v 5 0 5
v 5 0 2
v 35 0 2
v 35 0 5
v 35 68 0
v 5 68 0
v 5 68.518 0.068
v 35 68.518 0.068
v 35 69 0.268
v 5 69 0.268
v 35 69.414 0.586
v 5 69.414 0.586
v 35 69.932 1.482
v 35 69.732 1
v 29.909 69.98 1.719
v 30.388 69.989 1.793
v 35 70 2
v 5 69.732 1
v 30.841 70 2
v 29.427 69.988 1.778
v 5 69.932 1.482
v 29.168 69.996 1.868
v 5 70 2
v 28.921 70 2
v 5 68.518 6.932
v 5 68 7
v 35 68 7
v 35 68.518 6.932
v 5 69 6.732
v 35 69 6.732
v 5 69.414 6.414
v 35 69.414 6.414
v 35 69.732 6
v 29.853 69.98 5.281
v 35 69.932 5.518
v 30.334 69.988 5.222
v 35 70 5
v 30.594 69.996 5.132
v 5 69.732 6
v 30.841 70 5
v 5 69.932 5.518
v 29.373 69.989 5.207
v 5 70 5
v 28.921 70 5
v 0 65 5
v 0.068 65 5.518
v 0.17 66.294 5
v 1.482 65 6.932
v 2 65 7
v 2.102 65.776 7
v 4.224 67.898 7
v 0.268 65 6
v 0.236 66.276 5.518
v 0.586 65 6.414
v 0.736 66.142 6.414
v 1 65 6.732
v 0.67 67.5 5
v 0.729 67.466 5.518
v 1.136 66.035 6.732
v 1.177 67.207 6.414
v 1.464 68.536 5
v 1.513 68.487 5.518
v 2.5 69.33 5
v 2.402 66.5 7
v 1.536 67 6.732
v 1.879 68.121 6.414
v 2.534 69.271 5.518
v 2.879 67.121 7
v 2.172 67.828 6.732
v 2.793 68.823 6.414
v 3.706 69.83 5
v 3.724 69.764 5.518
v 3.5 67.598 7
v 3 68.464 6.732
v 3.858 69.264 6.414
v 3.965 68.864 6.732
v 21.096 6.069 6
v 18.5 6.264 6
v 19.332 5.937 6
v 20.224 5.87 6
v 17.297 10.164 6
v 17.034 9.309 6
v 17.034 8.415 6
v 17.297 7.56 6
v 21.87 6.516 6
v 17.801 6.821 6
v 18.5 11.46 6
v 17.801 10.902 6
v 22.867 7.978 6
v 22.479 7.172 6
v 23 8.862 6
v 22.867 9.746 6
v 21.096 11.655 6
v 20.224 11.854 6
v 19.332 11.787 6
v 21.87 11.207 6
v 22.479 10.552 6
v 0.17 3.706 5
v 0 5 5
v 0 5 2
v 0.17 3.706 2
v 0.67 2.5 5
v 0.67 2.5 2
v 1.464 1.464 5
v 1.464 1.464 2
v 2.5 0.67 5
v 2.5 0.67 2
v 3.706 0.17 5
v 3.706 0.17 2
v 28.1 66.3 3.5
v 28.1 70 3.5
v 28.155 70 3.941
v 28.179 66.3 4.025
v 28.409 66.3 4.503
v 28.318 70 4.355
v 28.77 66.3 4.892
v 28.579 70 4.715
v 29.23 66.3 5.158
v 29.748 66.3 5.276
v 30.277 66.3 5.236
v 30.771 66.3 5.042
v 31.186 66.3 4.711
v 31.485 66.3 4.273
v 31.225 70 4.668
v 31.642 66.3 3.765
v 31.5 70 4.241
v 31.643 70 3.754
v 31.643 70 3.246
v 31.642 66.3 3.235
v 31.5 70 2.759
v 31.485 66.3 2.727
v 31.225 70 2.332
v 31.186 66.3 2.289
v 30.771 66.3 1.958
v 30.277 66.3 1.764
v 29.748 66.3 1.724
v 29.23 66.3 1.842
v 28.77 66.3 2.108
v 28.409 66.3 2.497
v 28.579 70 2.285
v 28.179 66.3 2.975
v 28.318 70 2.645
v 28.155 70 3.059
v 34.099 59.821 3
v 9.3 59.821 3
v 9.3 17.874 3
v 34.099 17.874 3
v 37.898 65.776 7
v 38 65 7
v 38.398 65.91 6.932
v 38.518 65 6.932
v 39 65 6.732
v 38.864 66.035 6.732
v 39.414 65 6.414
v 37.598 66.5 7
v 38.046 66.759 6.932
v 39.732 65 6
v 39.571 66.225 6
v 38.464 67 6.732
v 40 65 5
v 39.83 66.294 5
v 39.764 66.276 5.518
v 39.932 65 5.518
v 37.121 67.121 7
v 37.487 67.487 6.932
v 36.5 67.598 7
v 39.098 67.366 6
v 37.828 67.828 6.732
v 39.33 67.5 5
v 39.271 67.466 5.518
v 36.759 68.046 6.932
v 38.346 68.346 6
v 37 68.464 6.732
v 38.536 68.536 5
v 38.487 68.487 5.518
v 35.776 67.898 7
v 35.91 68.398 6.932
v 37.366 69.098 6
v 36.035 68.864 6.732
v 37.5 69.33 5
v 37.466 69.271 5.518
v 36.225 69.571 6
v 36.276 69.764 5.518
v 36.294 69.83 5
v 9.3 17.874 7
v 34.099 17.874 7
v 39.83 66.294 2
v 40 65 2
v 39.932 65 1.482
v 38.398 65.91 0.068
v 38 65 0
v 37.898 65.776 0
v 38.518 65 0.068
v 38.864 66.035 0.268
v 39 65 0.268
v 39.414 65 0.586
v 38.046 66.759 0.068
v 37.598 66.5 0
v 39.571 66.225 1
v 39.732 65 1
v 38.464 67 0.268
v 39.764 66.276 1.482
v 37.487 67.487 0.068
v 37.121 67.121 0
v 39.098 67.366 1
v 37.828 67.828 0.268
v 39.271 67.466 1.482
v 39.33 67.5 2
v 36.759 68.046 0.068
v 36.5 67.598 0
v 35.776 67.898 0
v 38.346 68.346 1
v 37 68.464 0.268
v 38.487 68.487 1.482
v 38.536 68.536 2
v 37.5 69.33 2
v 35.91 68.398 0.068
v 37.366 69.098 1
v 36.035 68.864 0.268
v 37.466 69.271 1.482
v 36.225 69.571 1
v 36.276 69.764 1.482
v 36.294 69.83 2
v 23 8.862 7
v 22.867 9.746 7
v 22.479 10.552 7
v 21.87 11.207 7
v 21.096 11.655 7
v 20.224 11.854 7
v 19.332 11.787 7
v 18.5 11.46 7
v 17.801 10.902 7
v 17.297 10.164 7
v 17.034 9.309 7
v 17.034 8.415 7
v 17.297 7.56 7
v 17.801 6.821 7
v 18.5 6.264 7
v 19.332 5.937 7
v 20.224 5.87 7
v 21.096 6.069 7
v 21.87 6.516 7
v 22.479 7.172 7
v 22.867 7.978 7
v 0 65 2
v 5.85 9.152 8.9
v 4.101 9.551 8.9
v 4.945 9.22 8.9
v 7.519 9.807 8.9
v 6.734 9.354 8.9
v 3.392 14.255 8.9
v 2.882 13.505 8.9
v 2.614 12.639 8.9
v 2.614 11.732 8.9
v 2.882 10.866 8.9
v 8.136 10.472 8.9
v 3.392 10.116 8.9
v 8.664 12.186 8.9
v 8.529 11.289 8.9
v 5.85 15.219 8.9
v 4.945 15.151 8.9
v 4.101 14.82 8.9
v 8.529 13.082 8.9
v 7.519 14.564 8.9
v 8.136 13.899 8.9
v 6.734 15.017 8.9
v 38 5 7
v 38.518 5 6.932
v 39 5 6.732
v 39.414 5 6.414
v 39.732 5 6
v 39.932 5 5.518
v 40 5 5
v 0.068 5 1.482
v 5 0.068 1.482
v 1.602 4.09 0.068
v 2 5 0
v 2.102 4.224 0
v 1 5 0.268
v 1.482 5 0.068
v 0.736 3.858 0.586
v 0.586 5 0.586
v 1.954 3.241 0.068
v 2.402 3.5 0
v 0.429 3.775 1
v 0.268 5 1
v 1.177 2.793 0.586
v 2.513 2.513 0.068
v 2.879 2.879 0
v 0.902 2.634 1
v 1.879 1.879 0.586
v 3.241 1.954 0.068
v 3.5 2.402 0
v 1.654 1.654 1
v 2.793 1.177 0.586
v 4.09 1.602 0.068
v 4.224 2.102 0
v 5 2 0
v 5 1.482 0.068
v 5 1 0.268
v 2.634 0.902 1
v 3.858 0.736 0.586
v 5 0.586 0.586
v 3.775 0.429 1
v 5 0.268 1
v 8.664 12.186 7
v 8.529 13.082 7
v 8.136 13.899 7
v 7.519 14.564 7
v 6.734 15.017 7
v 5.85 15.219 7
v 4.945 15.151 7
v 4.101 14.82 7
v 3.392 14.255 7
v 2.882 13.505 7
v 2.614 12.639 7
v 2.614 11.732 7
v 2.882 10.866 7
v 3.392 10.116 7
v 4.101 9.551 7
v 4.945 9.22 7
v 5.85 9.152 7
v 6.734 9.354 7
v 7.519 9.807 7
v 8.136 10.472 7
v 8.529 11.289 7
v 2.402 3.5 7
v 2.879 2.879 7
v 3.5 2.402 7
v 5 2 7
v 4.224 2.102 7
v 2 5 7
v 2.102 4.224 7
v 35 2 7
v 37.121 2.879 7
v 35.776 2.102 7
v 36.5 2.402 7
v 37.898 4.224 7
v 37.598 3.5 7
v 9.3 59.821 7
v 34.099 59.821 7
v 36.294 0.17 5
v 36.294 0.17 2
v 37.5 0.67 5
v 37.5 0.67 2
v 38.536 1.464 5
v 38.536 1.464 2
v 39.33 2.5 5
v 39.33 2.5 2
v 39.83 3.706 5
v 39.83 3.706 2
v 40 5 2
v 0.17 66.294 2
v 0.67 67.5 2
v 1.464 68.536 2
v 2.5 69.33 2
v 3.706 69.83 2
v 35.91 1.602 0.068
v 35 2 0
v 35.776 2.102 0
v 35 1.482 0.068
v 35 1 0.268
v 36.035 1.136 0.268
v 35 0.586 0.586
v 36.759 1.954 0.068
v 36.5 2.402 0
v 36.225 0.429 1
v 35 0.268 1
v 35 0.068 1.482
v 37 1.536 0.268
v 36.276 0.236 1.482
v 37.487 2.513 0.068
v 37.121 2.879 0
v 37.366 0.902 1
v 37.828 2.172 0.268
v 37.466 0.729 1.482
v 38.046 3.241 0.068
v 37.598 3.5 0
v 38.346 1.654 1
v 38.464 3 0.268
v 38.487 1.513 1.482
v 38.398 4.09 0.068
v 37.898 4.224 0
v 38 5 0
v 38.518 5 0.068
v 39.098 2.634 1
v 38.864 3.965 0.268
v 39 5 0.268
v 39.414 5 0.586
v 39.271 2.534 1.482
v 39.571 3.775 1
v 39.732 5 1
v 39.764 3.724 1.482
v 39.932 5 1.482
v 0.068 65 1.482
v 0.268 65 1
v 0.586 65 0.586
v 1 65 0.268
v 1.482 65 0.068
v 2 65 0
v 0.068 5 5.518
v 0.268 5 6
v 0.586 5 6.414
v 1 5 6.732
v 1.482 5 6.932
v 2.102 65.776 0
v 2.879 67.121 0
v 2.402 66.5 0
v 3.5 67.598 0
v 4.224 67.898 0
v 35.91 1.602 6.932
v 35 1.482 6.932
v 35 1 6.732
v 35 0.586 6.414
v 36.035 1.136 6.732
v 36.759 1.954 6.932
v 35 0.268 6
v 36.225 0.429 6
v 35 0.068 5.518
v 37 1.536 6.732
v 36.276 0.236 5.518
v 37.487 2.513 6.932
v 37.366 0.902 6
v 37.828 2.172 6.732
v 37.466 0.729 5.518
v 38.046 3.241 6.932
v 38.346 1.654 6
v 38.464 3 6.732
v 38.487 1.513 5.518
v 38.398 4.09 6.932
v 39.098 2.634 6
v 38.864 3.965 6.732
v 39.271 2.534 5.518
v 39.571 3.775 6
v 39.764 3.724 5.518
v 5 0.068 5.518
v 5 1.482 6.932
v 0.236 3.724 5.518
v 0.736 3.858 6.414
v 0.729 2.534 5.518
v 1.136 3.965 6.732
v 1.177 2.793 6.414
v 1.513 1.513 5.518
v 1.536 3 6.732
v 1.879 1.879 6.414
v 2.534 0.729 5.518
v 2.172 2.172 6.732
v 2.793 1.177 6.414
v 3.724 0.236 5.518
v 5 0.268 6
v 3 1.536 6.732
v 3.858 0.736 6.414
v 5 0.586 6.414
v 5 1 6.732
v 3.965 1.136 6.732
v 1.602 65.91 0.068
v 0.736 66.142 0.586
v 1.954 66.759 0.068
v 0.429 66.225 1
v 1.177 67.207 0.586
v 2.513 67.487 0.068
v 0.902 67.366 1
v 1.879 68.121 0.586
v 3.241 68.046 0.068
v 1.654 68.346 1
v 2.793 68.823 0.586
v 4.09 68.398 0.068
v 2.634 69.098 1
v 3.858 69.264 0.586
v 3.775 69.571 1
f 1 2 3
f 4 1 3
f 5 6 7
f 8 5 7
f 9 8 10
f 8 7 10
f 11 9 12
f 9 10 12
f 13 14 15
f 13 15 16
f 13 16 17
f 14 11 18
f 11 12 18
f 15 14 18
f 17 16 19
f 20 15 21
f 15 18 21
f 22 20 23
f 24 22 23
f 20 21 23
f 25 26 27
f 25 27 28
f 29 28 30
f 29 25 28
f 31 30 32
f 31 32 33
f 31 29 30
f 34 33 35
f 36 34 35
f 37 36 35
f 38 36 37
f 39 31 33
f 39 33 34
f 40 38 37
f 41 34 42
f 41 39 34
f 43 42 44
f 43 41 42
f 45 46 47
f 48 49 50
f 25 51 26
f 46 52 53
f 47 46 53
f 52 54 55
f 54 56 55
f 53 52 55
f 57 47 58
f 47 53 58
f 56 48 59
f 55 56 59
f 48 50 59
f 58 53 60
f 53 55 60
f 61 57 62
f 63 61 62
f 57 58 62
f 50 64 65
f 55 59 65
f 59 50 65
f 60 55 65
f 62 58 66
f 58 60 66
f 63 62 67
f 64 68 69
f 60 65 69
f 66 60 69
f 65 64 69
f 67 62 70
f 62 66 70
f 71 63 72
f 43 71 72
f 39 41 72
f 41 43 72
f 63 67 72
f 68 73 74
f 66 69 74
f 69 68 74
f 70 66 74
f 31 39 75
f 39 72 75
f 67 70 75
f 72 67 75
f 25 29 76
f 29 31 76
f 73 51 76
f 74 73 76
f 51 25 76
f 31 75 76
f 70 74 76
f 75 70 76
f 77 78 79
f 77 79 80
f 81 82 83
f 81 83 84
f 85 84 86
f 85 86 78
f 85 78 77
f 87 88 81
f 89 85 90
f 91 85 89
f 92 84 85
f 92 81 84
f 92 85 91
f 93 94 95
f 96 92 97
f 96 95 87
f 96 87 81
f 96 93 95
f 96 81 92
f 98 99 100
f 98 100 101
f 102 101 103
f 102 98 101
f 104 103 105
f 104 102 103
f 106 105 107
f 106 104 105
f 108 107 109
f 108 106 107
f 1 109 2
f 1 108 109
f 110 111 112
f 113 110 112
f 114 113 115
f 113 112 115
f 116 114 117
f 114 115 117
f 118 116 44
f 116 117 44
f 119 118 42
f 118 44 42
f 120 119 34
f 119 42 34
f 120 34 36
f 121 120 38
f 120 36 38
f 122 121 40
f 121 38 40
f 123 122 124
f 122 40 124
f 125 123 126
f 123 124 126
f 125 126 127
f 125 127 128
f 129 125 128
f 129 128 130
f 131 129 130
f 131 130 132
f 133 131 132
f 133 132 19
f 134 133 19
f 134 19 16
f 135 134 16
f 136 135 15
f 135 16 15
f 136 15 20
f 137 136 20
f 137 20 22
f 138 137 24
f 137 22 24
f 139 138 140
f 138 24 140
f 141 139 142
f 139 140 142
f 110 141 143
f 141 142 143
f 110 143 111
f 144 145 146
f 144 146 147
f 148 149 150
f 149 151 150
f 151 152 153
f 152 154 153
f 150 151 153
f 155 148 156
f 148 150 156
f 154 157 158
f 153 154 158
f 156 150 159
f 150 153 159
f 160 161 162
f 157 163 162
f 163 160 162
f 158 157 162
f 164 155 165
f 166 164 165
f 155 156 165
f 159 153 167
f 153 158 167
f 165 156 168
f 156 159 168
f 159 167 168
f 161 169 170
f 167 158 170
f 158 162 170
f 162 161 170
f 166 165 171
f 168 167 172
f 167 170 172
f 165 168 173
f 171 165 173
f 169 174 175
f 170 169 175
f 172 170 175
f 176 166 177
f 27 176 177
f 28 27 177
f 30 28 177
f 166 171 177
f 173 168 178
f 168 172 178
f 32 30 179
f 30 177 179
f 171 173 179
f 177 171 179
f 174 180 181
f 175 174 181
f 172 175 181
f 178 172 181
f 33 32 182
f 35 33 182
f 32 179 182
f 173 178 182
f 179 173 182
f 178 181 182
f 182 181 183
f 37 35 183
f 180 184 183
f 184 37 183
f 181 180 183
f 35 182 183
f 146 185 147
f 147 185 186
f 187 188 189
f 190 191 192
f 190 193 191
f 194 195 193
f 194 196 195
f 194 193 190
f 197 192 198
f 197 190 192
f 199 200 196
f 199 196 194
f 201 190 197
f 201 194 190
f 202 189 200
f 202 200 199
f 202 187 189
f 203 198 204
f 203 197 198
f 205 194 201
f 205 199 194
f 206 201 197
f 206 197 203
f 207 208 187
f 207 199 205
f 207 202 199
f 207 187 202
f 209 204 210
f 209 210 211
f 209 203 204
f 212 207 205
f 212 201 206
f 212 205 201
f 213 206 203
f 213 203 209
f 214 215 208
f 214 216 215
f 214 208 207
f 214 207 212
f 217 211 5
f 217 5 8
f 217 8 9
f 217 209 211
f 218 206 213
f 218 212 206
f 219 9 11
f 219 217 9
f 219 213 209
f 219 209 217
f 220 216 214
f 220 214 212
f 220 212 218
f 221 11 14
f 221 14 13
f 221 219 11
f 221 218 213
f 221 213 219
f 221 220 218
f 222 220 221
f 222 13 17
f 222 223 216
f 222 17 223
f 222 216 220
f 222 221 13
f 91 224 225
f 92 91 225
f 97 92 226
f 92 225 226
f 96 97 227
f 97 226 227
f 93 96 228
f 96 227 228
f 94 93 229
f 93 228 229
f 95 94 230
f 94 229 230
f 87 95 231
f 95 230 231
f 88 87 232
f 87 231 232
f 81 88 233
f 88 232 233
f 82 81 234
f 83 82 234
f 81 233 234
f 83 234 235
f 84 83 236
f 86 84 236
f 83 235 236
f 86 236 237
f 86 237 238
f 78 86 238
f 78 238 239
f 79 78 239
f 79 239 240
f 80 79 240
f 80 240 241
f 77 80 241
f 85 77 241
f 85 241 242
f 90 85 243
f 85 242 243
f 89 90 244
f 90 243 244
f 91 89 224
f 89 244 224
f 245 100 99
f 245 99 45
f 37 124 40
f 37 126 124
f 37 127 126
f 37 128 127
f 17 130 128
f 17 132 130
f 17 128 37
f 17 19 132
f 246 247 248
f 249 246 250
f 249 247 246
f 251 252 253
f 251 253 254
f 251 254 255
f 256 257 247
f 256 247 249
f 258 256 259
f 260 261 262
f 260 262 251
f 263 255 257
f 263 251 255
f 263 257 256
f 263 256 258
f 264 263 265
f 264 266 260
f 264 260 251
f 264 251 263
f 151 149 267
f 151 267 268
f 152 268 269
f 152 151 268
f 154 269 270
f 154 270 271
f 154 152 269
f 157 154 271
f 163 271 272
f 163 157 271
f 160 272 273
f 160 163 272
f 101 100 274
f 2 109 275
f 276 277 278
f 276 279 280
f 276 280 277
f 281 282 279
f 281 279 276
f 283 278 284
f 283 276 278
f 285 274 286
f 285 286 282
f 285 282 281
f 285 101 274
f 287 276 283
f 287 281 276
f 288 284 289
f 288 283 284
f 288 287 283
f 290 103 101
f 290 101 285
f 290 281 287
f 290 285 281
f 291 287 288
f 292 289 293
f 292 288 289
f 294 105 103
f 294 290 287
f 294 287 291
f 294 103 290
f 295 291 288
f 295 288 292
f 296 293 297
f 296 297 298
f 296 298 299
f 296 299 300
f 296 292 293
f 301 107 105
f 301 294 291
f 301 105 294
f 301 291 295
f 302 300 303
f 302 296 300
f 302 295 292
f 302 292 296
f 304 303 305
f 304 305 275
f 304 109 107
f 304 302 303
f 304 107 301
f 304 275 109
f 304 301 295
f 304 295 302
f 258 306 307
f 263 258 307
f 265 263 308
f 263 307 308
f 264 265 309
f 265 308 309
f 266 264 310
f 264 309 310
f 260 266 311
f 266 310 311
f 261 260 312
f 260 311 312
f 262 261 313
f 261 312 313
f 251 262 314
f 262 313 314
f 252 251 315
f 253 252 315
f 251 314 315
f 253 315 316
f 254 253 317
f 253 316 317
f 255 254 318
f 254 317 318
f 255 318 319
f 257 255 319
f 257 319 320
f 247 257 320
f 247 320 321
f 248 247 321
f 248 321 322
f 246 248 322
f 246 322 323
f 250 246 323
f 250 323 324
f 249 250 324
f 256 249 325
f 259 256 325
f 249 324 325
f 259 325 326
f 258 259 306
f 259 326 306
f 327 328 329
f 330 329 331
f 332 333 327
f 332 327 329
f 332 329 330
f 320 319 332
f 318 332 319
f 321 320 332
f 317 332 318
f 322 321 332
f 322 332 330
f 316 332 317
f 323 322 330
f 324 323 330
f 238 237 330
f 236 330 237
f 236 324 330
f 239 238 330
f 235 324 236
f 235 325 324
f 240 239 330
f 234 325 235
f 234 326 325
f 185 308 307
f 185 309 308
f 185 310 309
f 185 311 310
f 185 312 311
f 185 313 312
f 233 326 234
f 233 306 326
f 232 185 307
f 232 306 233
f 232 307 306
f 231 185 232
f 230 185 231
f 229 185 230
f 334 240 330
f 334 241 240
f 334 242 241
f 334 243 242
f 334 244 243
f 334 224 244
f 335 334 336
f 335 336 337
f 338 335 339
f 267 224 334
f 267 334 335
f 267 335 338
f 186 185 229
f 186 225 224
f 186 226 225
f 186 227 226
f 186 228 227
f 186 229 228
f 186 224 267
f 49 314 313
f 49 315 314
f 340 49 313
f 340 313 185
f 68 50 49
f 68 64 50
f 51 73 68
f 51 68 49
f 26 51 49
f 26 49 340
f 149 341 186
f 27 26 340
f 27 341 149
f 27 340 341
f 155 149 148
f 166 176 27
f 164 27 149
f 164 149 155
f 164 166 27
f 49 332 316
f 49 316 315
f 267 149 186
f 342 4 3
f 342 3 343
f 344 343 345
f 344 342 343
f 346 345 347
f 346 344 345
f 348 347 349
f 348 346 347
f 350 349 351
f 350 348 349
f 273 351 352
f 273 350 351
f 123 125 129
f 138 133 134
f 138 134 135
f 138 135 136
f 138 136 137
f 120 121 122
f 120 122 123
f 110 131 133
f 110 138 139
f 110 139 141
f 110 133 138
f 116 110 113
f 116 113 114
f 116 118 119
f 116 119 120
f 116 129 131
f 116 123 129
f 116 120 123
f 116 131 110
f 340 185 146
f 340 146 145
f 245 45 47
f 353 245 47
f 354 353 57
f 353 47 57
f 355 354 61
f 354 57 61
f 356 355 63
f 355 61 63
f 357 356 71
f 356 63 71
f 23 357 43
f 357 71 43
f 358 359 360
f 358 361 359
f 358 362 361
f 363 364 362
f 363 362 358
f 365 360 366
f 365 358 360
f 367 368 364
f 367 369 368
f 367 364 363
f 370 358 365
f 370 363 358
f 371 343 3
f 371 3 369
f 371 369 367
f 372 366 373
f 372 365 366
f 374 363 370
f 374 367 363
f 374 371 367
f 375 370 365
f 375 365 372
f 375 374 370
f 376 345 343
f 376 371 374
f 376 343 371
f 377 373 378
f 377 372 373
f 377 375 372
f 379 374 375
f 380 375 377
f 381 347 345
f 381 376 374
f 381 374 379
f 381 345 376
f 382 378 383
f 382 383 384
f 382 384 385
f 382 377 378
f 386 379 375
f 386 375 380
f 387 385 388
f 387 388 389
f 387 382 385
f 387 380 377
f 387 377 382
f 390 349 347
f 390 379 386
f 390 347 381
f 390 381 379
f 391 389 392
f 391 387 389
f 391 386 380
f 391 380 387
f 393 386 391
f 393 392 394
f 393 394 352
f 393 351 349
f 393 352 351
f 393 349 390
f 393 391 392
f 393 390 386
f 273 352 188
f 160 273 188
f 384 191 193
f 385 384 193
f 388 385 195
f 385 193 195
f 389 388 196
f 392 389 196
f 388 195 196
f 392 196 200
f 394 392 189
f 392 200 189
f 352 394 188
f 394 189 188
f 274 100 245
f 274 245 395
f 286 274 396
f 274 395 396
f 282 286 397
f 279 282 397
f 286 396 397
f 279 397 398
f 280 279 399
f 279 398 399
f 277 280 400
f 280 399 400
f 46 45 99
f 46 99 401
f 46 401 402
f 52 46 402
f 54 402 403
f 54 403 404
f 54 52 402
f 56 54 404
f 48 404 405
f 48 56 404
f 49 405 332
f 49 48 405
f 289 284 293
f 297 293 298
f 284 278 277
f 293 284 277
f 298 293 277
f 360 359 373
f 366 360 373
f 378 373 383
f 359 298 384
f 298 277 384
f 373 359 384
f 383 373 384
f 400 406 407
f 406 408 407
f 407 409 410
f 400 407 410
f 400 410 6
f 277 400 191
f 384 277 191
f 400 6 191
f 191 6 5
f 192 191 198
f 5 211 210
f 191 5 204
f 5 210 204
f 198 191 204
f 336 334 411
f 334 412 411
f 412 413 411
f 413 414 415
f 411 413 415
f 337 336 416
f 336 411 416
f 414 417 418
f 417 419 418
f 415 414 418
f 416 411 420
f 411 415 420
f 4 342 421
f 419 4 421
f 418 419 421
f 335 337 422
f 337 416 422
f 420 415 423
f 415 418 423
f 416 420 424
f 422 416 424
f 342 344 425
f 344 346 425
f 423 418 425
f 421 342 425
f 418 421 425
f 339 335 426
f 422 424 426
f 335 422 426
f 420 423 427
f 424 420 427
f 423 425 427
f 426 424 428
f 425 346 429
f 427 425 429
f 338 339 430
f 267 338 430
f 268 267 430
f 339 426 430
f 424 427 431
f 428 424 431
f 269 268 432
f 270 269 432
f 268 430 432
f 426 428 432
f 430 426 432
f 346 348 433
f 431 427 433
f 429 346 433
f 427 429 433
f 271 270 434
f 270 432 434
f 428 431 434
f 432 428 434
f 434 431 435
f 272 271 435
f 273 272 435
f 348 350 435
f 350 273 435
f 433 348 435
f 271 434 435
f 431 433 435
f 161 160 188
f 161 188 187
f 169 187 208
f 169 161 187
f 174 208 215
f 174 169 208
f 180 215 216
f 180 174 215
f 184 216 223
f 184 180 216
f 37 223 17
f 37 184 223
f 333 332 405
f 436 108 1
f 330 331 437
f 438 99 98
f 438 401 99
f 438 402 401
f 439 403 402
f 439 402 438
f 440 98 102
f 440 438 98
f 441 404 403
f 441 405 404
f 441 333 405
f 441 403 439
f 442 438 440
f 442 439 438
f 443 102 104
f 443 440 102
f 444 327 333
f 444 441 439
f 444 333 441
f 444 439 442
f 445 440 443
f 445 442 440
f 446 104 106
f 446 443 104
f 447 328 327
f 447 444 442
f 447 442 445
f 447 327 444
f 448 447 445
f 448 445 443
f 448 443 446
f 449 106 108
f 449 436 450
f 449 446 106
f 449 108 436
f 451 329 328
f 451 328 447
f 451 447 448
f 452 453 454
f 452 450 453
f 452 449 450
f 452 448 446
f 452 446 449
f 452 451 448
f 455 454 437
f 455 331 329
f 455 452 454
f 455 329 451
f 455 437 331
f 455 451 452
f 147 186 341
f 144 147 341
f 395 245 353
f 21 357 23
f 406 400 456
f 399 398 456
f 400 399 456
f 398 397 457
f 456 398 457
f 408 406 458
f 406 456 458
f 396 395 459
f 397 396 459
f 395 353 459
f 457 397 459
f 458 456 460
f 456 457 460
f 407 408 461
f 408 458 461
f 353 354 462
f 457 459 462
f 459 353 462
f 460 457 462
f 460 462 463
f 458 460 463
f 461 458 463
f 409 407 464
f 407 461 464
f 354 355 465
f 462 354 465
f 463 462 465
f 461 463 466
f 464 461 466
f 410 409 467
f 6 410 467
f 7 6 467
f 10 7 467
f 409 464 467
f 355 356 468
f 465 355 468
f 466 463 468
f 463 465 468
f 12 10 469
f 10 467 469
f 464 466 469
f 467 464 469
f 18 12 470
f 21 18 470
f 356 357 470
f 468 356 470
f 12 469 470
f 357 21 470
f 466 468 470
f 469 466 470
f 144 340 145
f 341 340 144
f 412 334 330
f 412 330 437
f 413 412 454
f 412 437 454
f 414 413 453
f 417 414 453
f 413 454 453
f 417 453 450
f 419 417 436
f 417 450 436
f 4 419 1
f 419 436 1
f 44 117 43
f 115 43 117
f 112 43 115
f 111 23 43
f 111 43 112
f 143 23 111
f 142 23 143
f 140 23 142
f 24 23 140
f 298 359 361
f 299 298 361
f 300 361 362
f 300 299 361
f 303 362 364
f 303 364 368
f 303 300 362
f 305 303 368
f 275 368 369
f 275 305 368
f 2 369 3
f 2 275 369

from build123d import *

# Parameters (mm, degrees)
F0_W         = 40
F0_H         = 70
F1_DEPTH     = 7
F2_R         = 5
F3_R         = 1.780942195
F4_DEPTH     = 3.7
F5_T1_DEPTH  = 60
F5_T3_DEPTH  = 30
F5_T6_ANGLE  = 90
F5_T8_ANGLE  = 90
F5_T10_ANGLE = 90
F5_T12_ANGLE = 90
F5_T14_ANGLE = 90
F5_T16_ANGLE = 90
F5_T18_ANGLE = 90
F5_T20_ANGLE = 90
F6_R         = 3
F7_DEPTH     = 1
F8_W         = 24.7989948839
F8_H         = 41.9472400099
F9_DEPTH     = 4
F10_R        = 3.0419567341
F11_DEPTH    = 1.9


# Not quite as in the source:
# - a fillet or chamfer that OpenCascade refuses, or shapes differently, is made with other operations: its cross-section is extruded or revolved along the edge and cut away or added


with BuildPart() as f1:
    # F0 (on Top) → F1 (new body)
    with BuildSketch(Plane.XY):
        with Locations((20, 35)):
            Rectangle(F0_W, F0_H)
    extrude(amount=F1_DEPTH)

    # F2
    f2_edges = [f1.edges().sort_by_distance(p)[0] for p in [
        (0, 0, 3.5),
        (40, 0, 3.5),
        (40, 70, 3.5),
        (0, 70, 3.5),
    ]]
    fillet(f2_edges, radius=F2_R)

    # F3 (on face) → F4 (cut)
    with BuildSketch(Plane(origin=(0, 70, 0), x_dir=(-1, 0, 0), z_dir=(0, 1, 0))):
        with Locations((-29.880721122, 3.5)):
            Circle(F3_R)
    extrude(amount=-F4_DEPTH, mode=Mode.SUBTRACT)

    # F5: fillet of radius 2 on 16 edges, made by hand

    # F5_s2 → F5_t1 (cut)
    with BuildSketch(Plane.XZ.offset(-65)):
        with BuildLine():
            ThreePointArc((38, 0), (39.4142135624, 0.5857864376), (40, 2))
            Line((40, 2), (40, 0))
            Line((40, 0), (38, 0))
        make_face()
        with BuildLine():
            ThreePointArc((38, 7), (39.4142135624, 6.4142135624), (40, 5))
            Line((40, 5), (40, 7))
            Line((40, 7), (38, 7))
        make_face()
        with BuildLine():
            ThreePointArc((0, 2), (0.5857864376, 0.5857864376), (2, 0))
            Line((2, 0), (0, 0))
            Line((0, 0), (0, 2))
        make_face()
        with BuildLine():
            ThreePointArc((0, 5), (0.5857864376, 6.4142135624), (2, 7))
            Line((2, 7), (0, 7))
            Line((0, 7), (0, 5))
        make_face()
    extrude(amount=F5_T1_DEPTH, mode=Mode.SUBTRACT)

    # F5_s4 → F5_t3 (cut)
    with BuildSketch(Plane.YZ.offset(5)):
        with BuildLine():
            ThreePointArc((68, 0), (69.4142135624, 0.5857864376), (70, 2))
            Line((70, 2), (70, 0))
            Line((70, 0), (68, 0))
        make_face()
        with BuildLine():
            ThreePointArc((2, 0), (0.5857864376, 0.5857864376), (0, 2))
            Line((0, 2), (0, 0))
            Line((0, 0), (2, 0))
        make_face()
        with BuildLine():
            ThreePointArc((68, 7), (69.4142135624, 6.4142135624), (70, 5))
            Line((70, 5), (70, 7))
            Line((70, 7), (68, 7))
        make_face()
        with BuildLine():
            ThreePointArc((2, 7), (0.5857864376, 6.4142135624), (0, 5))
            Line((0, 5), (0, 7))
            Line((0, 7), (2, 7))
        make_face()
    extrude(amount=F5_T3_DEPTH, mode=Mode.SUBTRACT)

    # F5_s5 → F5_t6 (revolve, cut)
    with BuildSketch(Plane.XZ.offset(-65)):
        with BuildLine():
            ThreePointArc((2, 0), (0.5857864376, 0.5857864376), (0, 2))
            Line((0, 2), (0, 0))
            Line((0, 0), (2, 0))
        make_face()
    revolve(axis=Axis((5, 65, 0), (0, 0, -1)), revolution_arc=F5_T6_ANGLE, mode=Mode.SUBTRACT)

    # F5_s7 → F5_t8 (revolve, cut)
    with BuildSketch(Plane.XZ.offset(-5)):
        with BuildLine():
            ThreePointArc((2, 0), (0.5857864376, 0.5857864376), (0, 2))
            Line((0, 2), (0, 0))
            Line((0, 0), (2, 0))
        make_face()
    revolve(axis=Axis((5, 5, 0), (0, 0, 1)), revolution_arc=F5_T8_ANGLE, mode=Mode.SUBTRACT)

    # F5_s9 → F5_t10 (revolve, cut)
    with BuildSketch(Plane.XZ.offset(-65)):
        with BuildLine():
            ThreePointArc((38, 0), (39.4142135624, 0.5857864376), (40, 2))
            Line((40, 2), (40, 0))
            Line((40, 0), (38, 0))
        make_face()
    revolve(axis=Axis((35, 65, 0), (0, 0, 1)), revolution_arc=F5_T10_ANGLE, mode=Mode.SUBTRACT)

    # F5_s11 → F5_t12 (revolve, cut)
    with BuildSketch(Plane.YZ.offset(35)):
        with BuildLine():
            ThreePointArc((2, 0), (0.5857864376, 0.5857864376), (0, 2))
            Line((0, 2), (0, 0))
            Line((0, 0), (2, 0))
        make_face()
    revolve(axis=Axis((35, 5, 0), (0, 0, 1)), revolution_arc=F5_T12_ANGLE, mode=Mode.SUBTRACT)

    # F5_s13 → F5_t14 (revolve, cut)
    with BuildSketch(Plane.XZ.offset(-65)):
        with BuildLine():
            ThreePointArc((0, 5), (0.5857864376, 6.4142135624), (2, 7))
            Line((2, 7), (0, 7))
            Line((0, 7), (0, 5))
        make_face()
    revolve(axis=Axis((5, 65, 7), (0, 0, -1)), revolution_arc=F5_T14_ANGLE, mode=Mode.SUBTRACT)

    # F5_s15 → F5_t16 (revolve, cut)
    with BuildSketch(Plane.XZ.offset(-5)):
        with BuildLine():
            ThreePointArc((0, 5), (0.5857864376, 6.4142135624), (2, 7))
            Line((2, 7), (0, 7))
            Line((0, 7), (0, 5))
        make_face()
    revolve(axis=Axis((5, 5, 7), (0, 0, 1)), revolution_arc=F5_T16_ANGLE, mode=Mode.SUBTRACT)

    # F5_s17 → F5_t18 (revolve, cut)
    with BuildSketch(Plane.XZ.offset(-65)):
        with BuildLine():
            ThreePointArc((38, 7), (39.4142135624, 6.4142135624), (40, 5))
            Line((40, 5), (40, 7))
            Line((40, 7), (38, 7))
        make_face()
    revolve(axis=Axis((35, 65, 7), (0, 0, 1)), revolution_arc=F5_T18_ANGLE, mode=Mode.SUBTRACT)

    # F5_s19 → F5_t20 (revolve, cut)
    with BuildSketch(Plane.YZ.offset(35)):
        with BuildLine():
            ThreePointArc((2, 7), (0.5857864376, 6.4142135624), (0, 5))
            Line((0, 5), (0, 7))
            Line((0, 7), (2, 7))
        make_face()
    revolve(axis=Axis((35, 5, 7), (0, 0, 1)), revolution_arc=F5_T20_ANGLE, mode=Mode.SUBTRACT)

    # F6 (on face) → F7 (cut)
    with BuildSketch(Plane.XY.offset(7)):
        with Locations((20, 8.8619329035)):
            Circle(F6_R)
    extrude(amount=-F7_DEPTH, mode=Mode.SUBTRACT)

    # F8 (on face) → F9 (cut)
    with BuildSketch(Plane.XY.offset(7)):
        with Locations((21.6991202906, 38.8473635539)):
            Rectangle(F8_W, F8_H)
    extrude(amount=-F9_DEPTH, mode=Mode.SUBTRACT)

    # F10 (on face) → F11 (join)
    with BuildSketch(Plane.XY.offset(7)):
        with Locations((5.6223799475, 12.1855456382)):
            Circle(F10_R)
    extrude(amount=F11_DEPTH)


solid = f1.part
